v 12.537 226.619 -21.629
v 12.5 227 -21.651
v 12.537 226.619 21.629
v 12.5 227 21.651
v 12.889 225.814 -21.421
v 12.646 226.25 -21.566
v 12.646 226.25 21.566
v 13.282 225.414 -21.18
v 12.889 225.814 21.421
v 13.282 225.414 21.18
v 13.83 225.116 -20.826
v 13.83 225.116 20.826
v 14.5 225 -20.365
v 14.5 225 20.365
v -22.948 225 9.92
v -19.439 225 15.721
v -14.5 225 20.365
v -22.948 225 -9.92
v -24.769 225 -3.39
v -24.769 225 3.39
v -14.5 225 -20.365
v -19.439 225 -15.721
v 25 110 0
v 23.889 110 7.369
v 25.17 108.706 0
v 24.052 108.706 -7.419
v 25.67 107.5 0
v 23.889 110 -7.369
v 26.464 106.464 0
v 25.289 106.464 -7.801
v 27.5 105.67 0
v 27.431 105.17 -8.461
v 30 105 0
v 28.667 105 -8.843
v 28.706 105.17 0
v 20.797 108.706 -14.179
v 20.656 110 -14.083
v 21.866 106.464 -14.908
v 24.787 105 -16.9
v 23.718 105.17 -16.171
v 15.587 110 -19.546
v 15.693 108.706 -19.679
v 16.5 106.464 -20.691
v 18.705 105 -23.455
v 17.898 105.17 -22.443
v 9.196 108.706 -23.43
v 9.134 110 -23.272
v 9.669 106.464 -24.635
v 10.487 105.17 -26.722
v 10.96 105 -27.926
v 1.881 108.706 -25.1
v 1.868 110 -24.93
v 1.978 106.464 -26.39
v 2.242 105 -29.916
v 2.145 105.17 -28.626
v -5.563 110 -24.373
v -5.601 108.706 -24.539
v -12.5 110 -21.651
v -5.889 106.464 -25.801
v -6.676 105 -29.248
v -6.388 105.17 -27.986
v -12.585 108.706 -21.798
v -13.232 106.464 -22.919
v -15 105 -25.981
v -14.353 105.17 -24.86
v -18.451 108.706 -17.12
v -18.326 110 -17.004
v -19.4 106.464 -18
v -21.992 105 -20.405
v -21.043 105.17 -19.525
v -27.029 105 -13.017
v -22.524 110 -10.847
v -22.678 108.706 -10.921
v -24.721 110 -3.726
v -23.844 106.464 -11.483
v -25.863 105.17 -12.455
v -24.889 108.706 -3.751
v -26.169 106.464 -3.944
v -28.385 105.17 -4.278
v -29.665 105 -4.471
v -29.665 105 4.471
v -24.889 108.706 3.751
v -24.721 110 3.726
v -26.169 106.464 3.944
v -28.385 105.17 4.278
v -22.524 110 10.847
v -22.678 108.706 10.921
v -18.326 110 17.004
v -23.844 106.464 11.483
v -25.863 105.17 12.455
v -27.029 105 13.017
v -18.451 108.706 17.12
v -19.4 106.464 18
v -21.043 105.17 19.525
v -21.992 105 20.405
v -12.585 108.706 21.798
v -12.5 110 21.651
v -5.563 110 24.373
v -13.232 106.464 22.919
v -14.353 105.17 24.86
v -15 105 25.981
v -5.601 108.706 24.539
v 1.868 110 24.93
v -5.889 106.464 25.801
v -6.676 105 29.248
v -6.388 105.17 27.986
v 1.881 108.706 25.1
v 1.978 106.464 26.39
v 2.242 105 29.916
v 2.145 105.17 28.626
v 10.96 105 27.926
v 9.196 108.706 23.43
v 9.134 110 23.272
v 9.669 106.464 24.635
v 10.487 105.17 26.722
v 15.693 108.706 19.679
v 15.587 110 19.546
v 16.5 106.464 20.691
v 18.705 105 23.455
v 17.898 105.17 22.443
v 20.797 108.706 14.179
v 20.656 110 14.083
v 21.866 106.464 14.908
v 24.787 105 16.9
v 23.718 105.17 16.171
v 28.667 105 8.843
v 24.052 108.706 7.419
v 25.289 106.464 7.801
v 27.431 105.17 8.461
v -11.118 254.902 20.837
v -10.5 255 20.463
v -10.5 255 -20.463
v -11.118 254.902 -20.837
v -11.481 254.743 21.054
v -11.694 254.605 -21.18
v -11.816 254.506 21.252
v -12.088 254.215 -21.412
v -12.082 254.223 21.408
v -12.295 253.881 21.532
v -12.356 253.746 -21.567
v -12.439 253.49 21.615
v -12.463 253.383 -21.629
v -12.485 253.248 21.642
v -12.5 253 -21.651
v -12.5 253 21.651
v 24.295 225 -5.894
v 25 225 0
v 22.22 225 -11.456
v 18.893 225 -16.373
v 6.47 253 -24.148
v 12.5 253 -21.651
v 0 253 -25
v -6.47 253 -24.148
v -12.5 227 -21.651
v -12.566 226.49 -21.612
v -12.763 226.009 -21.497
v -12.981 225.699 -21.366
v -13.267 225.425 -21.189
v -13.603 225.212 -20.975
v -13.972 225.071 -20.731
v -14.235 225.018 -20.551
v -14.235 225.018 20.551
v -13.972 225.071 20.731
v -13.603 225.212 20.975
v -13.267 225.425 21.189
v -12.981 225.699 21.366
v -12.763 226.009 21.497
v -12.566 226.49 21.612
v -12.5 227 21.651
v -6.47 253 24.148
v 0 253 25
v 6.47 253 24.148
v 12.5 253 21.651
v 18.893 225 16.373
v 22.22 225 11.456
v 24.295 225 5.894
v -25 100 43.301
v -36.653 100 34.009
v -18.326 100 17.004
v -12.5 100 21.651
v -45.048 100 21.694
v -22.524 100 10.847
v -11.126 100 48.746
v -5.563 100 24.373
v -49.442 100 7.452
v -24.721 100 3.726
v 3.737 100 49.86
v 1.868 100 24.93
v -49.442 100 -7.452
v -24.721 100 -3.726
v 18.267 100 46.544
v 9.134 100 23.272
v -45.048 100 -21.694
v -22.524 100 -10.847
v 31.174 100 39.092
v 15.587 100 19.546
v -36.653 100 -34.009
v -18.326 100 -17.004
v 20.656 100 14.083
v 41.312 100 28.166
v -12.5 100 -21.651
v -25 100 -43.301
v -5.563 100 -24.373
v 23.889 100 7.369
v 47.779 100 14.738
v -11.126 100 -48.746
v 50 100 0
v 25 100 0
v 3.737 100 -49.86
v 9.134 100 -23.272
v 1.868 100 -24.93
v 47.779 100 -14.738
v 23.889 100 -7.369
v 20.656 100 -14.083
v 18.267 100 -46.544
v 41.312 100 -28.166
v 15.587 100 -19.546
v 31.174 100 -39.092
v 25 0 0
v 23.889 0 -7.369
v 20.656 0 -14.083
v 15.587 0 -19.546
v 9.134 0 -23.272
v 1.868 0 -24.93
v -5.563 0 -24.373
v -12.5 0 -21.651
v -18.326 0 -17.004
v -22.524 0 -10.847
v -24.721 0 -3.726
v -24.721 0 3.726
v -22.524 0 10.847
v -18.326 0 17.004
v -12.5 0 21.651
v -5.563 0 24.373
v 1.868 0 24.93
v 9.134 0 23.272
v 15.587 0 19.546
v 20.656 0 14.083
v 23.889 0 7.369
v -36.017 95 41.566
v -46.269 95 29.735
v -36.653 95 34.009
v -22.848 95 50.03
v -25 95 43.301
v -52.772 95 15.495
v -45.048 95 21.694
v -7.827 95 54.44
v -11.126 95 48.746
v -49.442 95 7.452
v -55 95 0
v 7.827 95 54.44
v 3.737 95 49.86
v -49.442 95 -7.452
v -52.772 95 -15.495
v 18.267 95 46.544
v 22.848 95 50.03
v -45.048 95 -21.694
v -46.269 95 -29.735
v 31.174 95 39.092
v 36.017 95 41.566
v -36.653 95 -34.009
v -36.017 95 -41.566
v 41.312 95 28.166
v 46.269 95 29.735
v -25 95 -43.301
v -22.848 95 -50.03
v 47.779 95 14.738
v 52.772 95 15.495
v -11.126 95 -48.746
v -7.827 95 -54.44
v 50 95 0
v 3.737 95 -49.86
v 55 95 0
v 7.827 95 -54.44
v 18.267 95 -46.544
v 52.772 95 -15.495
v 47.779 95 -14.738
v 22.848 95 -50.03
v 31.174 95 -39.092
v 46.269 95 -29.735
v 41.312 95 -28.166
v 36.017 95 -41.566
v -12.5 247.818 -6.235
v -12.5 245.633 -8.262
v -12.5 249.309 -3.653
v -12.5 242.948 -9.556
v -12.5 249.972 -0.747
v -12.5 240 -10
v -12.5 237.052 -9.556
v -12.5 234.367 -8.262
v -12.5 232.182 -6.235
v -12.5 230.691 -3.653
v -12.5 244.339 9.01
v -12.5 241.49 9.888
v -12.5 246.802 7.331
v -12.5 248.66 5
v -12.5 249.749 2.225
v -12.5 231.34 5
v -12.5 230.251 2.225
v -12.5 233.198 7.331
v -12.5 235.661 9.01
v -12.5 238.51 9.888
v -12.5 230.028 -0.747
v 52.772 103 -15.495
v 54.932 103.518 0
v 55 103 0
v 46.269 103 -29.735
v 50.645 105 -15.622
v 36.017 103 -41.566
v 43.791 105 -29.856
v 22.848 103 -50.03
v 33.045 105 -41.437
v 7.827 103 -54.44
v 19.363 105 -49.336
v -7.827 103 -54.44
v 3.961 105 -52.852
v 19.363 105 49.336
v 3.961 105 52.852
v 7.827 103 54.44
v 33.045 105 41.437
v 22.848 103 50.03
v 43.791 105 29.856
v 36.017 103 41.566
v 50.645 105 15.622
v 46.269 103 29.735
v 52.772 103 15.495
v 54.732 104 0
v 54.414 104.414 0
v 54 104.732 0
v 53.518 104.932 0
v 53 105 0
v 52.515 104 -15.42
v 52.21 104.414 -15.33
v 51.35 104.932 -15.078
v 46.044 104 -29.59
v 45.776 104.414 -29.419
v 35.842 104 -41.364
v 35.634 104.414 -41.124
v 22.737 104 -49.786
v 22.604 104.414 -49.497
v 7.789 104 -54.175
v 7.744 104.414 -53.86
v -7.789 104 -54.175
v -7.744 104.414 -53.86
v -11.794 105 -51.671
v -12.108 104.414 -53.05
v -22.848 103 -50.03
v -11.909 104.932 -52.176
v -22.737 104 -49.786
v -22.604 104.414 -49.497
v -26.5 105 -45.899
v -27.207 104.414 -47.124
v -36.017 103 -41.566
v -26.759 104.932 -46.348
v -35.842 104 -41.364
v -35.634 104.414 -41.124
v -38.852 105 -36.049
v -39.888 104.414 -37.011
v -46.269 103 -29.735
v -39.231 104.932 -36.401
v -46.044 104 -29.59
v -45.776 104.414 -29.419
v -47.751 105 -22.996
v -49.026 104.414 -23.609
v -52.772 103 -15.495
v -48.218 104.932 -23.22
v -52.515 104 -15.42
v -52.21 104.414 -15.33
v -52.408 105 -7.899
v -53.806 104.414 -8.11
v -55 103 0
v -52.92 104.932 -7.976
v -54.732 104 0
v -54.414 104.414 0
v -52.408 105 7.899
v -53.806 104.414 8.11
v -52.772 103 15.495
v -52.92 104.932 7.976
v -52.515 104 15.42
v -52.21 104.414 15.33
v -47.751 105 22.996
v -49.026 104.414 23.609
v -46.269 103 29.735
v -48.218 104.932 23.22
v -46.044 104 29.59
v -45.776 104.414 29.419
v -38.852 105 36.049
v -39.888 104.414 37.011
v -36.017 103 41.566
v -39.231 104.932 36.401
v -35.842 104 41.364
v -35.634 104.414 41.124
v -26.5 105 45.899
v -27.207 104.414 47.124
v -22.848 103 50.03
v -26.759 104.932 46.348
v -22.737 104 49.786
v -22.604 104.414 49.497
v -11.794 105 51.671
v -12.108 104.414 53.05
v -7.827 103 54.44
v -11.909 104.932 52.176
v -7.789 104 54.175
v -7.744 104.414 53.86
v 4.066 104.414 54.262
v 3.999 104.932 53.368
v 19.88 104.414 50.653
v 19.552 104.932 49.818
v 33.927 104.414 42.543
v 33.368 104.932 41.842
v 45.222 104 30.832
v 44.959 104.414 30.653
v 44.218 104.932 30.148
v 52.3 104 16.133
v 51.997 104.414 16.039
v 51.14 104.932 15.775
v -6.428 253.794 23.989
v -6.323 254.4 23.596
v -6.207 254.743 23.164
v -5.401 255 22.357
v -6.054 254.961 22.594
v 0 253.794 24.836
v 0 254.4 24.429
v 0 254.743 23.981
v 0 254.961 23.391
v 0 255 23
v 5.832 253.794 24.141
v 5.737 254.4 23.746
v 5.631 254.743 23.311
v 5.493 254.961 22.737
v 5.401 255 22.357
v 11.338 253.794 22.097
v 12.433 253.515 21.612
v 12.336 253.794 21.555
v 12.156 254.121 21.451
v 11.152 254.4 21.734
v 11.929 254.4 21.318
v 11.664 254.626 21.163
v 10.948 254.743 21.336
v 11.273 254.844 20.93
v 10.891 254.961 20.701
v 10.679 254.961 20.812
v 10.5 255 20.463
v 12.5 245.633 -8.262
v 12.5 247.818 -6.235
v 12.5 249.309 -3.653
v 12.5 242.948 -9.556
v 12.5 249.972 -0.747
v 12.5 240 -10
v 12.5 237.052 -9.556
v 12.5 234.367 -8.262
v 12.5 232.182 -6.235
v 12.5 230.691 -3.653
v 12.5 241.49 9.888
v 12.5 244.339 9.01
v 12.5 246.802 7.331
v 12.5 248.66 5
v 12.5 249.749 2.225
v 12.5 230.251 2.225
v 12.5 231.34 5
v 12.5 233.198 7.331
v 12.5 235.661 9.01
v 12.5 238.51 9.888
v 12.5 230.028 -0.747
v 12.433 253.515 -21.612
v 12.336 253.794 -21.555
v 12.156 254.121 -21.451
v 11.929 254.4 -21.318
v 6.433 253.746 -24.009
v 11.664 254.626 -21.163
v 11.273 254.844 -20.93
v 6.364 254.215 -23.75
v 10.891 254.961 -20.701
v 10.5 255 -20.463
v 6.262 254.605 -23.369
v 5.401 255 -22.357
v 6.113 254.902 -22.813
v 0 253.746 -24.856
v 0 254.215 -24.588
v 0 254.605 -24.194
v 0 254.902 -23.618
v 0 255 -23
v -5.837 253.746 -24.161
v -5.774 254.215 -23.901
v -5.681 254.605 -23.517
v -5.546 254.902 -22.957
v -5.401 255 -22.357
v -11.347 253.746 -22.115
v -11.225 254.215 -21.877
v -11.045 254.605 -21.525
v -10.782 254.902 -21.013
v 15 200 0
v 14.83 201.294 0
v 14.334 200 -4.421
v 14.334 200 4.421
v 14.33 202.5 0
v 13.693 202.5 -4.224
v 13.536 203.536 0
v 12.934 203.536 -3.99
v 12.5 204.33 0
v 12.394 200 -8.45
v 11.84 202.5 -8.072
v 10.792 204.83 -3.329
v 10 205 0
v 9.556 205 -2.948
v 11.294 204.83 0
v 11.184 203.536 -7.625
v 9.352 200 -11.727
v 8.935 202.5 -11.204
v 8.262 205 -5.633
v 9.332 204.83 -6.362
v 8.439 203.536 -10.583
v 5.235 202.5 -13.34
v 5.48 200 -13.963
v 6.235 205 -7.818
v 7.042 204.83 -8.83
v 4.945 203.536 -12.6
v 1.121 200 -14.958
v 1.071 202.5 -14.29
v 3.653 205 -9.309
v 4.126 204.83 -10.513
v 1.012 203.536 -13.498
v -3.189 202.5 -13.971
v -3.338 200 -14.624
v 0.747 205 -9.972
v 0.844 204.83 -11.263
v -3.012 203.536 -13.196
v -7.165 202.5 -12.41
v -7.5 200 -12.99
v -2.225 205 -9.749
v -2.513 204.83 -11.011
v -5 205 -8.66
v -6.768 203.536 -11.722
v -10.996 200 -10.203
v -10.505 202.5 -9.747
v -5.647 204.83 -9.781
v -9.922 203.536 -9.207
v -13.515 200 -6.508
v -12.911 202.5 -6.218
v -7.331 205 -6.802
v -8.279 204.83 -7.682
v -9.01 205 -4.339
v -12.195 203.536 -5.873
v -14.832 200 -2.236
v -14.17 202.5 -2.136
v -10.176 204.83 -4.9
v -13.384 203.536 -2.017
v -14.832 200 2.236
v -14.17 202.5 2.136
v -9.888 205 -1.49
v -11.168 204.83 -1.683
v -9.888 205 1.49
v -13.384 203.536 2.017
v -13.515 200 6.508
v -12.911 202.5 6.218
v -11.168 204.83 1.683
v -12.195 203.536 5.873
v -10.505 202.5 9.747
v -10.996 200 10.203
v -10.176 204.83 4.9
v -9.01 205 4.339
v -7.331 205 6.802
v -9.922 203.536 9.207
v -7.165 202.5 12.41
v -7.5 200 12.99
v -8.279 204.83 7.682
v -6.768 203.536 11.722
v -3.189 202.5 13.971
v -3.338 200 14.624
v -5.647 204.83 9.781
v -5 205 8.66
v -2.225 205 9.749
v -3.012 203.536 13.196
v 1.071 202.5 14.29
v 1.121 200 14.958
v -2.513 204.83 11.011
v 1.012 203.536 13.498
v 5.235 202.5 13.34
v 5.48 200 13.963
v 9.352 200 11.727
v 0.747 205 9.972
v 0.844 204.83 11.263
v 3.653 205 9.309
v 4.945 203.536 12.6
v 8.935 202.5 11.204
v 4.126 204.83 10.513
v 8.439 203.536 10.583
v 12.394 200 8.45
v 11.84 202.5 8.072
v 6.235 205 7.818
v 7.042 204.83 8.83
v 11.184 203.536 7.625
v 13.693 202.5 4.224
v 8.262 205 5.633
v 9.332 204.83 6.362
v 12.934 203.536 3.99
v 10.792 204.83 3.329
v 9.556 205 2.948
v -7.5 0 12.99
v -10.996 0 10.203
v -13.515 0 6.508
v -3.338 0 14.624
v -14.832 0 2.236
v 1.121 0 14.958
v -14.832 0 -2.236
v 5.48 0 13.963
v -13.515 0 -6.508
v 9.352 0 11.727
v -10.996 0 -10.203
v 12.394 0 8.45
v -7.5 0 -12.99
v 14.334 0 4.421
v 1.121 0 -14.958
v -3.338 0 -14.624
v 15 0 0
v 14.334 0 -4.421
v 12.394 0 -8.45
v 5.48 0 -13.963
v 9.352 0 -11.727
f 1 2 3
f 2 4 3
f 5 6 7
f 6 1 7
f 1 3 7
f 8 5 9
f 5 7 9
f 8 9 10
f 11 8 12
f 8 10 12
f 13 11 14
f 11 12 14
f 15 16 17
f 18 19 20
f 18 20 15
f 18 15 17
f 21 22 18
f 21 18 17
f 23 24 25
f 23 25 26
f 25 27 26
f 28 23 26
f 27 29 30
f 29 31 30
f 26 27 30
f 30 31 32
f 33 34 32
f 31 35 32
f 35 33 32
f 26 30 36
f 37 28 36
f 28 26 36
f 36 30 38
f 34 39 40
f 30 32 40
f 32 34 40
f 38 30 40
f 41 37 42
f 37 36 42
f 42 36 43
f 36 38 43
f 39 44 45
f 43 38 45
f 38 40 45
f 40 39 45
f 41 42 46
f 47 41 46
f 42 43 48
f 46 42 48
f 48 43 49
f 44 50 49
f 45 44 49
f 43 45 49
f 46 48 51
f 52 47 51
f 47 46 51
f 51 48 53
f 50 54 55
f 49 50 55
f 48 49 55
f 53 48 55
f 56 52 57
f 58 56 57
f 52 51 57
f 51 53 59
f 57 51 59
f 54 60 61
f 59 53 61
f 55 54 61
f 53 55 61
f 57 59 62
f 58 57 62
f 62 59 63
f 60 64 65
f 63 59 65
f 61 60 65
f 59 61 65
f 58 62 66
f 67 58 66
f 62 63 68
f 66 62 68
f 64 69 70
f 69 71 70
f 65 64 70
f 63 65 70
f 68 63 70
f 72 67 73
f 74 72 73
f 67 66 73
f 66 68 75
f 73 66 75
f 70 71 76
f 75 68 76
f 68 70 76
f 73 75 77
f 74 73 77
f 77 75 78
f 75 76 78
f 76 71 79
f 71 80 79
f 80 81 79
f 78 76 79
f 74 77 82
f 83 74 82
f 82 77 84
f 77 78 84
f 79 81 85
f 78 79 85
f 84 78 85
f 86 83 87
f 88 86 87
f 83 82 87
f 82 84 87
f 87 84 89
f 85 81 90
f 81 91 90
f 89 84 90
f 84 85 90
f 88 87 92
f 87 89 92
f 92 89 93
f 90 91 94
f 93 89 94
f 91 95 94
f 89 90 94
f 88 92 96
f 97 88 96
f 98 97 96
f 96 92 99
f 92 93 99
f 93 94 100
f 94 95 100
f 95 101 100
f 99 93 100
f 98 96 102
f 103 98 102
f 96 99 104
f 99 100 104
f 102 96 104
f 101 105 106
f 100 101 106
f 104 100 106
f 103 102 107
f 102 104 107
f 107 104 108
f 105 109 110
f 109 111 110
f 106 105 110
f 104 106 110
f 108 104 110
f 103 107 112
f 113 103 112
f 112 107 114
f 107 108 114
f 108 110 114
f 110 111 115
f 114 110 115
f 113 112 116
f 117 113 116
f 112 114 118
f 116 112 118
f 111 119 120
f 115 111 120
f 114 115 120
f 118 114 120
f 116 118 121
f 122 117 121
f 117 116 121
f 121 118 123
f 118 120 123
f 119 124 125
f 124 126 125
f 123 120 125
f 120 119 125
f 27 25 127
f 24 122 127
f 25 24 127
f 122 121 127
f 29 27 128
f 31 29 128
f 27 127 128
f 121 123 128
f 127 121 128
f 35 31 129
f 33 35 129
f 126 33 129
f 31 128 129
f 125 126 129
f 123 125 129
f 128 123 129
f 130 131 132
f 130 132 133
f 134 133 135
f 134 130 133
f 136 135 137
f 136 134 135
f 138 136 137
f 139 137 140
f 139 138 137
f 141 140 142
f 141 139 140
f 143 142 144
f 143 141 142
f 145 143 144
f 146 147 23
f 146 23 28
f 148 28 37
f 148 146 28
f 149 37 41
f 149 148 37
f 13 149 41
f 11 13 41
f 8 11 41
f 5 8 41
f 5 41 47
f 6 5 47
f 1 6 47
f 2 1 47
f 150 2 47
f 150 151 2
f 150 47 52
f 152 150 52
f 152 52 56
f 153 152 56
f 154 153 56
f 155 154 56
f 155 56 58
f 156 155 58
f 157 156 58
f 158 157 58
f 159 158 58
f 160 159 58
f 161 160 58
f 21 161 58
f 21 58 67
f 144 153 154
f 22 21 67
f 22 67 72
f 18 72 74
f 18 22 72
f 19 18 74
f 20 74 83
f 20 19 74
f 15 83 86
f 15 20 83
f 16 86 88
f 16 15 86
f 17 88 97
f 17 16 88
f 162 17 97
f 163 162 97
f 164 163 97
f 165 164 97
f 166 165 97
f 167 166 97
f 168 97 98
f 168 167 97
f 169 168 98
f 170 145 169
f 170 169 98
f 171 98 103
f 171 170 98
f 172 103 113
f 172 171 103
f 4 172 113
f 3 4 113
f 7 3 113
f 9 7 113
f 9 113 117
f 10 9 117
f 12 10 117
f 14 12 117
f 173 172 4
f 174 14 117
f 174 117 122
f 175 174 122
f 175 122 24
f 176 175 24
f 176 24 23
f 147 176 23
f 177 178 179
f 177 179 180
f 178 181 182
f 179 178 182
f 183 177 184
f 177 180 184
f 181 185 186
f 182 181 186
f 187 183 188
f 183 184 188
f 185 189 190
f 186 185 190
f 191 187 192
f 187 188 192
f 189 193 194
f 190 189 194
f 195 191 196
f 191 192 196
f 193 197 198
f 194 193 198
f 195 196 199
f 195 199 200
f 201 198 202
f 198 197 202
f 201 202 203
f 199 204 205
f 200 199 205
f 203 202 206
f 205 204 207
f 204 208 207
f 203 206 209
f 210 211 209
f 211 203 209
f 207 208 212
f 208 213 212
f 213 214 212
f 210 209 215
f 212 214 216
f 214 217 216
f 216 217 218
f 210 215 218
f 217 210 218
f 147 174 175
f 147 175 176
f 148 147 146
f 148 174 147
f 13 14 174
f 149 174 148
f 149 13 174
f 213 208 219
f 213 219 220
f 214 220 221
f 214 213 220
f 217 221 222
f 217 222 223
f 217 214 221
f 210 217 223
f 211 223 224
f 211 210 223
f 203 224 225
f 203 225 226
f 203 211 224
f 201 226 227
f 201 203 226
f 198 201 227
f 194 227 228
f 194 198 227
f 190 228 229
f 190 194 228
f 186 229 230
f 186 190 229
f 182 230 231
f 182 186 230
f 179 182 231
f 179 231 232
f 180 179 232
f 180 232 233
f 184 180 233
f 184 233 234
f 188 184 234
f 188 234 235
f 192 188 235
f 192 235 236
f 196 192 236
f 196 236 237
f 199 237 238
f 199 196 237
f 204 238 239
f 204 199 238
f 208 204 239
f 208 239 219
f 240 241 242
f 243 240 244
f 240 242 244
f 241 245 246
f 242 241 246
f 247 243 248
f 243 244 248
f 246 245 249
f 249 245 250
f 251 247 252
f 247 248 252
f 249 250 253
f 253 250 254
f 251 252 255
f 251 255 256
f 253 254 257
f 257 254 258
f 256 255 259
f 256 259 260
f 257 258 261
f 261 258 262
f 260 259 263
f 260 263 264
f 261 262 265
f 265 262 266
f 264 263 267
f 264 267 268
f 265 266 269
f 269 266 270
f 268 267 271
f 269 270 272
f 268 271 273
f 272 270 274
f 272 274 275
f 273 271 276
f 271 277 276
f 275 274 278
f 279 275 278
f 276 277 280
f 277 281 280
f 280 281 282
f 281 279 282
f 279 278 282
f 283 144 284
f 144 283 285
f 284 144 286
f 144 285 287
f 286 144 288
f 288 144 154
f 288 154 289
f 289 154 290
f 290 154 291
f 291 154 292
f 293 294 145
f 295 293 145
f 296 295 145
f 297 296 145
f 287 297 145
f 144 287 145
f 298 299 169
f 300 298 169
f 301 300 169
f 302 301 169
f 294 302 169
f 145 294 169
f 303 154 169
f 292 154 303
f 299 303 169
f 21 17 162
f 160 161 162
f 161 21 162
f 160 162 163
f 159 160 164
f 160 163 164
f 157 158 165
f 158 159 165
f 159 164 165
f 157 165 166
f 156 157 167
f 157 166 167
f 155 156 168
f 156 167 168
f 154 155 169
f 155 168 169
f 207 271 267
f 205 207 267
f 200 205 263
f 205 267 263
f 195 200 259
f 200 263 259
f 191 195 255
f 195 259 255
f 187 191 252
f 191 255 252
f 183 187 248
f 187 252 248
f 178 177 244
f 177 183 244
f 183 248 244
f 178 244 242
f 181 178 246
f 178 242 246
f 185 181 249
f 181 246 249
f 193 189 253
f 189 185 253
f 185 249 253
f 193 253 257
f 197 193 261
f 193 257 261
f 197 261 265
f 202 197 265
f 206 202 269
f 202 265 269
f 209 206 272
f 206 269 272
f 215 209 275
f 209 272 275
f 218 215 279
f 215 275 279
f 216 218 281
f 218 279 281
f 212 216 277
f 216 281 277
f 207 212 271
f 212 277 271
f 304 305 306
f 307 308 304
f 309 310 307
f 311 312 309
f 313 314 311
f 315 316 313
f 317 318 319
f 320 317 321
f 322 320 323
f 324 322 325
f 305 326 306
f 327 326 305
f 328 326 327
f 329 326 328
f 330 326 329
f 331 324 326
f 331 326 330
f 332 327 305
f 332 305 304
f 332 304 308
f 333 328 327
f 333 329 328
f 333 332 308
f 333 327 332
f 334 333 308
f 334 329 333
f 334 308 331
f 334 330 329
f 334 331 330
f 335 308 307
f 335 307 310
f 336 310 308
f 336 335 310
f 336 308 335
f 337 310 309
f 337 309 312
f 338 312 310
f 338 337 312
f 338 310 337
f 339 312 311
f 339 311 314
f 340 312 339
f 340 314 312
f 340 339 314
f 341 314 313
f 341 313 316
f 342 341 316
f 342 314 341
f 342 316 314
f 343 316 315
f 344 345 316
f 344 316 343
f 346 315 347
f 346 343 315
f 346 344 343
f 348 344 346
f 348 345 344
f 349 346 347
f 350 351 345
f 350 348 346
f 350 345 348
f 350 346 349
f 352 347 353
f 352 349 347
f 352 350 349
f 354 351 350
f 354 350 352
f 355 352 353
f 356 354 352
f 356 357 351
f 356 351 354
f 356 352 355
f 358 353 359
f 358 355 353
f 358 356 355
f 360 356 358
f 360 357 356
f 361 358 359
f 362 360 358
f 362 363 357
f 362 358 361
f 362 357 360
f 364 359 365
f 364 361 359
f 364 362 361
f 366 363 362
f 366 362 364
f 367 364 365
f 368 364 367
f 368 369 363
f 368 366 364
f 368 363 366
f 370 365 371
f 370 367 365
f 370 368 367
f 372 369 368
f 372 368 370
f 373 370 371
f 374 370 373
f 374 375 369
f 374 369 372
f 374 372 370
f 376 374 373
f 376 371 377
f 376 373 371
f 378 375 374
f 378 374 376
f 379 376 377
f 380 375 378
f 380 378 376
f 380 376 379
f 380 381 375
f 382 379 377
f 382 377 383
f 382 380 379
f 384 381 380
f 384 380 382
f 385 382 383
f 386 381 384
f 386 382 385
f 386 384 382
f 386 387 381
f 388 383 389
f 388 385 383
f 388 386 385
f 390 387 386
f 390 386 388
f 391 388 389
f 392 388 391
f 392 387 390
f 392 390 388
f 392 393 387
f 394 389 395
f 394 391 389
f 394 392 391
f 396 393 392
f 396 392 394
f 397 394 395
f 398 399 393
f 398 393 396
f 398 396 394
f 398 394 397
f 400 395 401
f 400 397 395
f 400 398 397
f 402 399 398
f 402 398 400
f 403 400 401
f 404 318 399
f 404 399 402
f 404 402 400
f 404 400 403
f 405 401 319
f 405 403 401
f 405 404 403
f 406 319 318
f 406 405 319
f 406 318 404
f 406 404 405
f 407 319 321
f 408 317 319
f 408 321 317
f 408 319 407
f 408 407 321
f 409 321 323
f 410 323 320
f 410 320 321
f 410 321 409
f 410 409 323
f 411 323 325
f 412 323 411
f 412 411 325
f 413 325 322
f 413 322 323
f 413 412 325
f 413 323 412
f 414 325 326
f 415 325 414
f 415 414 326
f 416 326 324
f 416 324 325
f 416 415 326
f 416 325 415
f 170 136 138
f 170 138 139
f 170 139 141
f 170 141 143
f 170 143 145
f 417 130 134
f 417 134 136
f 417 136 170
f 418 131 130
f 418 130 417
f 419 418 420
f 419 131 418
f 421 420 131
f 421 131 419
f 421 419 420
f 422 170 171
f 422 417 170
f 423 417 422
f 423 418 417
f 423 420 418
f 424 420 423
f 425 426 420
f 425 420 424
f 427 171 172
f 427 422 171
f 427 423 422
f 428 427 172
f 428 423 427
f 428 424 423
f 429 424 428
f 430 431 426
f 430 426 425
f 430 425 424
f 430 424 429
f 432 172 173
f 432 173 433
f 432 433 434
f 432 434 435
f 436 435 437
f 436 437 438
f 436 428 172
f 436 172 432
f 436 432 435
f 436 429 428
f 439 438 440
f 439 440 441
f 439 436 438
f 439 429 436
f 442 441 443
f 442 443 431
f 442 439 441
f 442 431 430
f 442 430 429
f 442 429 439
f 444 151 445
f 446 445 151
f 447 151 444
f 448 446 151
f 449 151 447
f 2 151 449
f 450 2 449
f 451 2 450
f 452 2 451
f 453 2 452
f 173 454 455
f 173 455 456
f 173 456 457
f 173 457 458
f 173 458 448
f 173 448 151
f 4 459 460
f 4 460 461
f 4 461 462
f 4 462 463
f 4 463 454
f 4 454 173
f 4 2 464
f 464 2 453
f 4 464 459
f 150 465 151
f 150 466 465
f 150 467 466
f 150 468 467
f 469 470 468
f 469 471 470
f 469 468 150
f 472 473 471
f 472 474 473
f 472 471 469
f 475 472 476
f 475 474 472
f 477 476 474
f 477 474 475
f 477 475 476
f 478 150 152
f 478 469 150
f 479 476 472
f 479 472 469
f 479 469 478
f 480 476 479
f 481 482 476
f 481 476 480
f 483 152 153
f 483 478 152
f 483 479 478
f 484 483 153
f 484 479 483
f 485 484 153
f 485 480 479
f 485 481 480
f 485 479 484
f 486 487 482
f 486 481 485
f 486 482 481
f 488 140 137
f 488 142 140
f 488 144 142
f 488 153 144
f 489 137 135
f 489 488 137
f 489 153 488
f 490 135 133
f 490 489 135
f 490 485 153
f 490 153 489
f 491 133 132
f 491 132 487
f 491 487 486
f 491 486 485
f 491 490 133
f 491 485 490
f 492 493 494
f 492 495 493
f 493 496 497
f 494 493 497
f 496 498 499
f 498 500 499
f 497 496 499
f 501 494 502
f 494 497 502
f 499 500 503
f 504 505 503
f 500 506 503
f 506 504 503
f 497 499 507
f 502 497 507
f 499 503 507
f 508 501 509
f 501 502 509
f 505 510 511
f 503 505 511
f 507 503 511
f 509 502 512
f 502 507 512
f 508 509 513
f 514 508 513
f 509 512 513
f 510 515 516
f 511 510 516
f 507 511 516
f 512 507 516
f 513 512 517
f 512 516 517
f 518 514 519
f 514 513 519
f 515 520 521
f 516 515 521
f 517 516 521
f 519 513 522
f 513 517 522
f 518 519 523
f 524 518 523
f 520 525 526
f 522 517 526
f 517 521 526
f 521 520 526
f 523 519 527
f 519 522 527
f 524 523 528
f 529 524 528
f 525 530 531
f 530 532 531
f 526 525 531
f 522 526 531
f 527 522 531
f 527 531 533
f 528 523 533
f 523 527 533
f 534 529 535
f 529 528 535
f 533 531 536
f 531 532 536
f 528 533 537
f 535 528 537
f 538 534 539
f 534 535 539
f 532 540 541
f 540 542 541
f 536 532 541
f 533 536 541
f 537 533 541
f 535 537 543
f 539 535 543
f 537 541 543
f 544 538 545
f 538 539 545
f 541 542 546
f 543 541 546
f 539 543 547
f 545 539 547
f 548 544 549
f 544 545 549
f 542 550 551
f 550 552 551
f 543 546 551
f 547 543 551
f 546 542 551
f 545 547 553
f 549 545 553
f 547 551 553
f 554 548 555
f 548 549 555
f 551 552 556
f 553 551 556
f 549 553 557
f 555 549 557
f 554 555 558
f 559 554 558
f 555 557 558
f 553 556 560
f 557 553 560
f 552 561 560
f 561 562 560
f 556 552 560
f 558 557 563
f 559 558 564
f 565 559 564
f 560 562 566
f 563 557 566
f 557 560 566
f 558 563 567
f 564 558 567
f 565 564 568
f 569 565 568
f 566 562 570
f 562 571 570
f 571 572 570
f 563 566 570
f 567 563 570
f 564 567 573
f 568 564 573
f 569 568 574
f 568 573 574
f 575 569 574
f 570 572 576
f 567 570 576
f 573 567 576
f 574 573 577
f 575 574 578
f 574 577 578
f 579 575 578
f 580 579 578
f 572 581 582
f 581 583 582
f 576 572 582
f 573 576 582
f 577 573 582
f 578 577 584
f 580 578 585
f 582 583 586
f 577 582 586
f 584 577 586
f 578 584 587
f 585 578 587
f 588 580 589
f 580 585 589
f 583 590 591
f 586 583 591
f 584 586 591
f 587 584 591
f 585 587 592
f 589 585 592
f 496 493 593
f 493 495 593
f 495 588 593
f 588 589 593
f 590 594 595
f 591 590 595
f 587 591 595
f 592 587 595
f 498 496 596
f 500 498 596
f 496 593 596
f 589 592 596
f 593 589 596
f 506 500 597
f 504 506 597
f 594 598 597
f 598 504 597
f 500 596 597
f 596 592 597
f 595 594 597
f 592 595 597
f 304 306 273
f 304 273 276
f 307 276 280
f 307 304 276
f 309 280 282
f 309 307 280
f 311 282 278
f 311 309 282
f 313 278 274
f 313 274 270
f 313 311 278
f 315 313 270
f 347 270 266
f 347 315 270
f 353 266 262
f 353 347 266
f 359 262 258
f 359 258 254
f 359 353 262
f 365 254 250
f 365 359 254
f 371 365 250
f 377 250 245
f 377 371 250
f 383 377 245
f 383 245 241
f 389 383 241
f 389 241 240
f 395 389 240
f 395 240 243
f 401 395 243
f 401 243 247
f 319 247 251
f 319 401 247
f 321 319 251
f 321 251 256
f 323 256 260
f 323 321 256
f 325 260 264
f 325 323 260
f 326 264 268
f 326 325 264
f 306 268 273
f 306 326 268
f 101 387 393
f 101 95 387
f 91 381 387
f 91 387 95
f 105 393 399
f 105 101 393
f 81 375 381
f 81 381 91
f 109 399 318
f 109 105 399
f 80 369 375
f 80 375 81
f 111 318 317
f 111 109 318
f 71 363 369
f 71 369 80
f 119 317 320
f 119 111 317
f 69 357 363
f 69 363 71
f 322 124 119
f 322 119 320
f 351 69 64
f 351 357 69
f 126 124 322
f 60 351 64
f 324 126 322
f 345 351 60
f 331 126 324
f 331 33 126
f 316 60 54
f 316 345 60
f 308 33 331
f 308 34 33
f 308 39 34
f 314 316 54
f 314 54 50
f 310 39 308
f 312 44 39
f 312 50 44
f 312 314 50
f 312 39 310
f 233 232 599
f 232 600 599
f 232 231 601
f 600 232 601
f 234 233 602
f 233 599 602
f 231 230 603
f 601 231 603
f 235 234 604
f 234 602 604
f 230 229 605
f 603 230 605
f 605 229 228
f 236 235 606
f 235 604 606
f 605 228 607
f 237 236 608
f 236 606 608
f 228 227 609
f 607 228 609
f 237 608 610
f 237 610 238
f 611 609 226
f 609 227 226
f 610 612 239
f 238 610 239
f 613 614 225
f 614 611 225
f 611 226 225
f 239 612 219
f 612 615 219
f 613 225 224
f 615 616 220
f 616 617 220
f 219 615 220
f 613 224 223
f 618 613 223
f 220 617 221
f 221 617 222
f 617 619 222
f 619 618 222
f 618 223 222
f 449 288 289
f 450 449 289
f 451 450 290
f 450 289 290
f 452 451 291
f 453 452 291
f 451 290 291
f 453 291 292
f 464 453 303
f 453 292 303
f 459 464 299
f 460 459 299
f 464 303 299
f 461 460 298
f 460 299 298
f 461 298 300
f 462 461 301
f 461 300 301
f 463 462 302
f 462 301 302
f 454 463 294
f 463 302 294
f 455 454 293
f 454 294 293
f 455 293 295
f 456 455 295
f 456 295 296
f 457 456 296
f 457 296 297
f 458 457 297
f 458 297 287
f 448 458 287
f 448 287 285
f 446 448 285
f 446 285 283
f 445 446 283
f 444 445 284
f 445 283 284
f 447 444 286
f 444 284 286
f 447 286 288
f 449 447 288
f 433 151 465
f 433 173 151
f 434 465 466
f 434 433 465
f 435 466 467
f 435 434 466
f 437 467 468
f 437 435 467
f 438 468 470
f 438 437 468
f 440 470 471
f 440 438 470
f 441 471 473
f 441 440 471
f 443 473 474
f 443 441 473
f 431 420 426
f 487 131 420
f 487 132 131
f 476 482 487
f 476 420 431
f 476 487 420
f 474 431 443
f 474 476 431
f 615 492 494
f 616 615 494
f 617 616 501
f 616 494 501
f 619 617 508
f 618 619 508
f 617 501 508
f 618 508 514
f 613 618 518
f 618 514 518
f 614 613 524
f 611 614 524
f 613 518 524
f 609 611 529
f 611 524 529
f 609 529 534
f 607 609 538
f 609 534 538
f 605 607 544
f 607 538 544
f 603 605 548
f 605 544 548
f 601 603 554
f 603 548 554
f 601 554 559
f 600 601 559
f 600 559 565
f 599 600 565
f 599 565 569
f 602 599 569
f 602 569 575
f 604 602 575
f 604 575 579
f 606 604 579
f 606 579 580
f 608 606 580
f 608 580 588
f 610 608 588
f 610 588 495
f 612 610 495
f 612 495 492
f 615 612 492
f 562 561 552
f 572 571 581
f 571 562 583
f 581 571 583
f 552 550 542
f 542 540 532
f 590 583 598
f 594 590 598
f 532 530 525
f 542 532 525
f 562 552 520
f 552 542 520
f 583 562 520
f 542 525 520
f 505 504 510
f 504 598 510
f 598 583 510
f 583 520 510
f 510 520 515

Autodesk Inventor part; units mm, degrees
ref_plane "YZ Plane" through (0, 0, 0) normal (1, 0, 0) x (0, 1, 0)
ref_plane "XZ Plane" through (0, 0, 0) normal (0, 1, 0) x (-1, 0, 0)
ref_plane "XY Plane" through (0, 0, 0) normal (0, 0, 1) x (1, 0, 0)
sketch "Sketch1" plane through (0, 0, 0) normal (0, 0, 1) x (1, 0, 0)
  line L0 (15, 0) -> (25, 0)
  line L1 (25, 225) -> (0, 225)
  line L2 (0, 225) -> (0, 205)
  line L3 (25, 0) -> (25, 100)
  line L4 (25, 100) -> (50, 100)
  line L5 (50, 100) -> (50, 95)
  line L6 (50, 95) -> (55, 95)
  line L7 (55, 95) -> (55, 103)
  line L8 (53, 105) -> (30, 105)
  line L9 (25, 110) -> (25, 225)
  arc A0 (55, 103) -> (53, 105) centre (53, 103) ccw
  arc A1 (25, 110) -> (30, 105) centre (30, 110) ccw
  line L10 (0, 0) -> (0, 225)
  line L11 (15, 0) -> (15, 200)
  line L12 (10, 205) -> (0, 205)
  arc A2 (15, 200) -> (10, 205) centre (10, 200) ccw
  point P0 (20, 205)
  point P1 (55, 105)
  point P2 (25, 105)
  point P3 (15, 205)
  dimension "d1" = 10
  dimension "d2" = 225
  dimension "d3" = 20
  dimension "d4" = 20
  dimension "d6" = 100
  dimension "d7" = 25
  dimension "d8" = 5
  dimension "d9" = 5
  dimension "d10" = 10
  dimension "d11" = 2
  dimension "d12" = 5
  dimension "d28" = 205
  dimension "d29" = 5
revolve "Revolution1" add sketch "Sketch1" angle 360 about axis through (0, 0, 0) along (0, 1, 0)
sketch "Sketch2" plane through (0, 225, 0) normal (0, 1, 0) x (1, 0, 0)
  circle A0 centre (0, 0) radius 25 projected
  line L0 (-12.5, 21.6506) -> (-12.5, -21.6506)
  line L1 (12.5, 0) -> (12.5, 21.6506)
  line L2 (12.5, 21.6506) -> (12.5, -21.6506)
  arc A1 (12.5, 21.6506) -> (-12.5, 21.6506) centre (0, 0) ccw
  arc A2 (-12.5, -21.6506) -> (12.5, -21.6506) centre (0, 0) ccw
  dimension "d14" = 12.5
extrude "Extrusion1" add sketch "Sketch2" along normal blind 30 contours L1 L2 A0 L0
sketch "Sketch3" plane through (12.5, 225, 21.6506) normal (1, 0, 0) x (0, 0, -1)
  line L0 (0, 0) -> (43.3013, 0) projected
  line L1 (43.3013, 0) -> (43.3013, 30) projected
  line L2 (0, 30) -> (-3.3494, 30) projected
  circle A0 centre (21.6506, 15) radius 5
  point P0 (21.6506, -225)
  dimension "d18" = 10
hole "Hole1" at (12.5, 240, 0) direction (-1, 0, 0) diameter 20 end through all
fillet "Fillet1" radius 2 2 edges at (-12.5, 225, 0) (12.5, 225, -10.8253)
fillet "Fillet2" radius 2 4 edges at (12.5, 255, -10.8253) (-12.5, 255, 0) (0, 255, 25) (0, 255, -25)
properties part number "Hydraulic fluid shield" material "Steel, High Strength, Low Alloy"
